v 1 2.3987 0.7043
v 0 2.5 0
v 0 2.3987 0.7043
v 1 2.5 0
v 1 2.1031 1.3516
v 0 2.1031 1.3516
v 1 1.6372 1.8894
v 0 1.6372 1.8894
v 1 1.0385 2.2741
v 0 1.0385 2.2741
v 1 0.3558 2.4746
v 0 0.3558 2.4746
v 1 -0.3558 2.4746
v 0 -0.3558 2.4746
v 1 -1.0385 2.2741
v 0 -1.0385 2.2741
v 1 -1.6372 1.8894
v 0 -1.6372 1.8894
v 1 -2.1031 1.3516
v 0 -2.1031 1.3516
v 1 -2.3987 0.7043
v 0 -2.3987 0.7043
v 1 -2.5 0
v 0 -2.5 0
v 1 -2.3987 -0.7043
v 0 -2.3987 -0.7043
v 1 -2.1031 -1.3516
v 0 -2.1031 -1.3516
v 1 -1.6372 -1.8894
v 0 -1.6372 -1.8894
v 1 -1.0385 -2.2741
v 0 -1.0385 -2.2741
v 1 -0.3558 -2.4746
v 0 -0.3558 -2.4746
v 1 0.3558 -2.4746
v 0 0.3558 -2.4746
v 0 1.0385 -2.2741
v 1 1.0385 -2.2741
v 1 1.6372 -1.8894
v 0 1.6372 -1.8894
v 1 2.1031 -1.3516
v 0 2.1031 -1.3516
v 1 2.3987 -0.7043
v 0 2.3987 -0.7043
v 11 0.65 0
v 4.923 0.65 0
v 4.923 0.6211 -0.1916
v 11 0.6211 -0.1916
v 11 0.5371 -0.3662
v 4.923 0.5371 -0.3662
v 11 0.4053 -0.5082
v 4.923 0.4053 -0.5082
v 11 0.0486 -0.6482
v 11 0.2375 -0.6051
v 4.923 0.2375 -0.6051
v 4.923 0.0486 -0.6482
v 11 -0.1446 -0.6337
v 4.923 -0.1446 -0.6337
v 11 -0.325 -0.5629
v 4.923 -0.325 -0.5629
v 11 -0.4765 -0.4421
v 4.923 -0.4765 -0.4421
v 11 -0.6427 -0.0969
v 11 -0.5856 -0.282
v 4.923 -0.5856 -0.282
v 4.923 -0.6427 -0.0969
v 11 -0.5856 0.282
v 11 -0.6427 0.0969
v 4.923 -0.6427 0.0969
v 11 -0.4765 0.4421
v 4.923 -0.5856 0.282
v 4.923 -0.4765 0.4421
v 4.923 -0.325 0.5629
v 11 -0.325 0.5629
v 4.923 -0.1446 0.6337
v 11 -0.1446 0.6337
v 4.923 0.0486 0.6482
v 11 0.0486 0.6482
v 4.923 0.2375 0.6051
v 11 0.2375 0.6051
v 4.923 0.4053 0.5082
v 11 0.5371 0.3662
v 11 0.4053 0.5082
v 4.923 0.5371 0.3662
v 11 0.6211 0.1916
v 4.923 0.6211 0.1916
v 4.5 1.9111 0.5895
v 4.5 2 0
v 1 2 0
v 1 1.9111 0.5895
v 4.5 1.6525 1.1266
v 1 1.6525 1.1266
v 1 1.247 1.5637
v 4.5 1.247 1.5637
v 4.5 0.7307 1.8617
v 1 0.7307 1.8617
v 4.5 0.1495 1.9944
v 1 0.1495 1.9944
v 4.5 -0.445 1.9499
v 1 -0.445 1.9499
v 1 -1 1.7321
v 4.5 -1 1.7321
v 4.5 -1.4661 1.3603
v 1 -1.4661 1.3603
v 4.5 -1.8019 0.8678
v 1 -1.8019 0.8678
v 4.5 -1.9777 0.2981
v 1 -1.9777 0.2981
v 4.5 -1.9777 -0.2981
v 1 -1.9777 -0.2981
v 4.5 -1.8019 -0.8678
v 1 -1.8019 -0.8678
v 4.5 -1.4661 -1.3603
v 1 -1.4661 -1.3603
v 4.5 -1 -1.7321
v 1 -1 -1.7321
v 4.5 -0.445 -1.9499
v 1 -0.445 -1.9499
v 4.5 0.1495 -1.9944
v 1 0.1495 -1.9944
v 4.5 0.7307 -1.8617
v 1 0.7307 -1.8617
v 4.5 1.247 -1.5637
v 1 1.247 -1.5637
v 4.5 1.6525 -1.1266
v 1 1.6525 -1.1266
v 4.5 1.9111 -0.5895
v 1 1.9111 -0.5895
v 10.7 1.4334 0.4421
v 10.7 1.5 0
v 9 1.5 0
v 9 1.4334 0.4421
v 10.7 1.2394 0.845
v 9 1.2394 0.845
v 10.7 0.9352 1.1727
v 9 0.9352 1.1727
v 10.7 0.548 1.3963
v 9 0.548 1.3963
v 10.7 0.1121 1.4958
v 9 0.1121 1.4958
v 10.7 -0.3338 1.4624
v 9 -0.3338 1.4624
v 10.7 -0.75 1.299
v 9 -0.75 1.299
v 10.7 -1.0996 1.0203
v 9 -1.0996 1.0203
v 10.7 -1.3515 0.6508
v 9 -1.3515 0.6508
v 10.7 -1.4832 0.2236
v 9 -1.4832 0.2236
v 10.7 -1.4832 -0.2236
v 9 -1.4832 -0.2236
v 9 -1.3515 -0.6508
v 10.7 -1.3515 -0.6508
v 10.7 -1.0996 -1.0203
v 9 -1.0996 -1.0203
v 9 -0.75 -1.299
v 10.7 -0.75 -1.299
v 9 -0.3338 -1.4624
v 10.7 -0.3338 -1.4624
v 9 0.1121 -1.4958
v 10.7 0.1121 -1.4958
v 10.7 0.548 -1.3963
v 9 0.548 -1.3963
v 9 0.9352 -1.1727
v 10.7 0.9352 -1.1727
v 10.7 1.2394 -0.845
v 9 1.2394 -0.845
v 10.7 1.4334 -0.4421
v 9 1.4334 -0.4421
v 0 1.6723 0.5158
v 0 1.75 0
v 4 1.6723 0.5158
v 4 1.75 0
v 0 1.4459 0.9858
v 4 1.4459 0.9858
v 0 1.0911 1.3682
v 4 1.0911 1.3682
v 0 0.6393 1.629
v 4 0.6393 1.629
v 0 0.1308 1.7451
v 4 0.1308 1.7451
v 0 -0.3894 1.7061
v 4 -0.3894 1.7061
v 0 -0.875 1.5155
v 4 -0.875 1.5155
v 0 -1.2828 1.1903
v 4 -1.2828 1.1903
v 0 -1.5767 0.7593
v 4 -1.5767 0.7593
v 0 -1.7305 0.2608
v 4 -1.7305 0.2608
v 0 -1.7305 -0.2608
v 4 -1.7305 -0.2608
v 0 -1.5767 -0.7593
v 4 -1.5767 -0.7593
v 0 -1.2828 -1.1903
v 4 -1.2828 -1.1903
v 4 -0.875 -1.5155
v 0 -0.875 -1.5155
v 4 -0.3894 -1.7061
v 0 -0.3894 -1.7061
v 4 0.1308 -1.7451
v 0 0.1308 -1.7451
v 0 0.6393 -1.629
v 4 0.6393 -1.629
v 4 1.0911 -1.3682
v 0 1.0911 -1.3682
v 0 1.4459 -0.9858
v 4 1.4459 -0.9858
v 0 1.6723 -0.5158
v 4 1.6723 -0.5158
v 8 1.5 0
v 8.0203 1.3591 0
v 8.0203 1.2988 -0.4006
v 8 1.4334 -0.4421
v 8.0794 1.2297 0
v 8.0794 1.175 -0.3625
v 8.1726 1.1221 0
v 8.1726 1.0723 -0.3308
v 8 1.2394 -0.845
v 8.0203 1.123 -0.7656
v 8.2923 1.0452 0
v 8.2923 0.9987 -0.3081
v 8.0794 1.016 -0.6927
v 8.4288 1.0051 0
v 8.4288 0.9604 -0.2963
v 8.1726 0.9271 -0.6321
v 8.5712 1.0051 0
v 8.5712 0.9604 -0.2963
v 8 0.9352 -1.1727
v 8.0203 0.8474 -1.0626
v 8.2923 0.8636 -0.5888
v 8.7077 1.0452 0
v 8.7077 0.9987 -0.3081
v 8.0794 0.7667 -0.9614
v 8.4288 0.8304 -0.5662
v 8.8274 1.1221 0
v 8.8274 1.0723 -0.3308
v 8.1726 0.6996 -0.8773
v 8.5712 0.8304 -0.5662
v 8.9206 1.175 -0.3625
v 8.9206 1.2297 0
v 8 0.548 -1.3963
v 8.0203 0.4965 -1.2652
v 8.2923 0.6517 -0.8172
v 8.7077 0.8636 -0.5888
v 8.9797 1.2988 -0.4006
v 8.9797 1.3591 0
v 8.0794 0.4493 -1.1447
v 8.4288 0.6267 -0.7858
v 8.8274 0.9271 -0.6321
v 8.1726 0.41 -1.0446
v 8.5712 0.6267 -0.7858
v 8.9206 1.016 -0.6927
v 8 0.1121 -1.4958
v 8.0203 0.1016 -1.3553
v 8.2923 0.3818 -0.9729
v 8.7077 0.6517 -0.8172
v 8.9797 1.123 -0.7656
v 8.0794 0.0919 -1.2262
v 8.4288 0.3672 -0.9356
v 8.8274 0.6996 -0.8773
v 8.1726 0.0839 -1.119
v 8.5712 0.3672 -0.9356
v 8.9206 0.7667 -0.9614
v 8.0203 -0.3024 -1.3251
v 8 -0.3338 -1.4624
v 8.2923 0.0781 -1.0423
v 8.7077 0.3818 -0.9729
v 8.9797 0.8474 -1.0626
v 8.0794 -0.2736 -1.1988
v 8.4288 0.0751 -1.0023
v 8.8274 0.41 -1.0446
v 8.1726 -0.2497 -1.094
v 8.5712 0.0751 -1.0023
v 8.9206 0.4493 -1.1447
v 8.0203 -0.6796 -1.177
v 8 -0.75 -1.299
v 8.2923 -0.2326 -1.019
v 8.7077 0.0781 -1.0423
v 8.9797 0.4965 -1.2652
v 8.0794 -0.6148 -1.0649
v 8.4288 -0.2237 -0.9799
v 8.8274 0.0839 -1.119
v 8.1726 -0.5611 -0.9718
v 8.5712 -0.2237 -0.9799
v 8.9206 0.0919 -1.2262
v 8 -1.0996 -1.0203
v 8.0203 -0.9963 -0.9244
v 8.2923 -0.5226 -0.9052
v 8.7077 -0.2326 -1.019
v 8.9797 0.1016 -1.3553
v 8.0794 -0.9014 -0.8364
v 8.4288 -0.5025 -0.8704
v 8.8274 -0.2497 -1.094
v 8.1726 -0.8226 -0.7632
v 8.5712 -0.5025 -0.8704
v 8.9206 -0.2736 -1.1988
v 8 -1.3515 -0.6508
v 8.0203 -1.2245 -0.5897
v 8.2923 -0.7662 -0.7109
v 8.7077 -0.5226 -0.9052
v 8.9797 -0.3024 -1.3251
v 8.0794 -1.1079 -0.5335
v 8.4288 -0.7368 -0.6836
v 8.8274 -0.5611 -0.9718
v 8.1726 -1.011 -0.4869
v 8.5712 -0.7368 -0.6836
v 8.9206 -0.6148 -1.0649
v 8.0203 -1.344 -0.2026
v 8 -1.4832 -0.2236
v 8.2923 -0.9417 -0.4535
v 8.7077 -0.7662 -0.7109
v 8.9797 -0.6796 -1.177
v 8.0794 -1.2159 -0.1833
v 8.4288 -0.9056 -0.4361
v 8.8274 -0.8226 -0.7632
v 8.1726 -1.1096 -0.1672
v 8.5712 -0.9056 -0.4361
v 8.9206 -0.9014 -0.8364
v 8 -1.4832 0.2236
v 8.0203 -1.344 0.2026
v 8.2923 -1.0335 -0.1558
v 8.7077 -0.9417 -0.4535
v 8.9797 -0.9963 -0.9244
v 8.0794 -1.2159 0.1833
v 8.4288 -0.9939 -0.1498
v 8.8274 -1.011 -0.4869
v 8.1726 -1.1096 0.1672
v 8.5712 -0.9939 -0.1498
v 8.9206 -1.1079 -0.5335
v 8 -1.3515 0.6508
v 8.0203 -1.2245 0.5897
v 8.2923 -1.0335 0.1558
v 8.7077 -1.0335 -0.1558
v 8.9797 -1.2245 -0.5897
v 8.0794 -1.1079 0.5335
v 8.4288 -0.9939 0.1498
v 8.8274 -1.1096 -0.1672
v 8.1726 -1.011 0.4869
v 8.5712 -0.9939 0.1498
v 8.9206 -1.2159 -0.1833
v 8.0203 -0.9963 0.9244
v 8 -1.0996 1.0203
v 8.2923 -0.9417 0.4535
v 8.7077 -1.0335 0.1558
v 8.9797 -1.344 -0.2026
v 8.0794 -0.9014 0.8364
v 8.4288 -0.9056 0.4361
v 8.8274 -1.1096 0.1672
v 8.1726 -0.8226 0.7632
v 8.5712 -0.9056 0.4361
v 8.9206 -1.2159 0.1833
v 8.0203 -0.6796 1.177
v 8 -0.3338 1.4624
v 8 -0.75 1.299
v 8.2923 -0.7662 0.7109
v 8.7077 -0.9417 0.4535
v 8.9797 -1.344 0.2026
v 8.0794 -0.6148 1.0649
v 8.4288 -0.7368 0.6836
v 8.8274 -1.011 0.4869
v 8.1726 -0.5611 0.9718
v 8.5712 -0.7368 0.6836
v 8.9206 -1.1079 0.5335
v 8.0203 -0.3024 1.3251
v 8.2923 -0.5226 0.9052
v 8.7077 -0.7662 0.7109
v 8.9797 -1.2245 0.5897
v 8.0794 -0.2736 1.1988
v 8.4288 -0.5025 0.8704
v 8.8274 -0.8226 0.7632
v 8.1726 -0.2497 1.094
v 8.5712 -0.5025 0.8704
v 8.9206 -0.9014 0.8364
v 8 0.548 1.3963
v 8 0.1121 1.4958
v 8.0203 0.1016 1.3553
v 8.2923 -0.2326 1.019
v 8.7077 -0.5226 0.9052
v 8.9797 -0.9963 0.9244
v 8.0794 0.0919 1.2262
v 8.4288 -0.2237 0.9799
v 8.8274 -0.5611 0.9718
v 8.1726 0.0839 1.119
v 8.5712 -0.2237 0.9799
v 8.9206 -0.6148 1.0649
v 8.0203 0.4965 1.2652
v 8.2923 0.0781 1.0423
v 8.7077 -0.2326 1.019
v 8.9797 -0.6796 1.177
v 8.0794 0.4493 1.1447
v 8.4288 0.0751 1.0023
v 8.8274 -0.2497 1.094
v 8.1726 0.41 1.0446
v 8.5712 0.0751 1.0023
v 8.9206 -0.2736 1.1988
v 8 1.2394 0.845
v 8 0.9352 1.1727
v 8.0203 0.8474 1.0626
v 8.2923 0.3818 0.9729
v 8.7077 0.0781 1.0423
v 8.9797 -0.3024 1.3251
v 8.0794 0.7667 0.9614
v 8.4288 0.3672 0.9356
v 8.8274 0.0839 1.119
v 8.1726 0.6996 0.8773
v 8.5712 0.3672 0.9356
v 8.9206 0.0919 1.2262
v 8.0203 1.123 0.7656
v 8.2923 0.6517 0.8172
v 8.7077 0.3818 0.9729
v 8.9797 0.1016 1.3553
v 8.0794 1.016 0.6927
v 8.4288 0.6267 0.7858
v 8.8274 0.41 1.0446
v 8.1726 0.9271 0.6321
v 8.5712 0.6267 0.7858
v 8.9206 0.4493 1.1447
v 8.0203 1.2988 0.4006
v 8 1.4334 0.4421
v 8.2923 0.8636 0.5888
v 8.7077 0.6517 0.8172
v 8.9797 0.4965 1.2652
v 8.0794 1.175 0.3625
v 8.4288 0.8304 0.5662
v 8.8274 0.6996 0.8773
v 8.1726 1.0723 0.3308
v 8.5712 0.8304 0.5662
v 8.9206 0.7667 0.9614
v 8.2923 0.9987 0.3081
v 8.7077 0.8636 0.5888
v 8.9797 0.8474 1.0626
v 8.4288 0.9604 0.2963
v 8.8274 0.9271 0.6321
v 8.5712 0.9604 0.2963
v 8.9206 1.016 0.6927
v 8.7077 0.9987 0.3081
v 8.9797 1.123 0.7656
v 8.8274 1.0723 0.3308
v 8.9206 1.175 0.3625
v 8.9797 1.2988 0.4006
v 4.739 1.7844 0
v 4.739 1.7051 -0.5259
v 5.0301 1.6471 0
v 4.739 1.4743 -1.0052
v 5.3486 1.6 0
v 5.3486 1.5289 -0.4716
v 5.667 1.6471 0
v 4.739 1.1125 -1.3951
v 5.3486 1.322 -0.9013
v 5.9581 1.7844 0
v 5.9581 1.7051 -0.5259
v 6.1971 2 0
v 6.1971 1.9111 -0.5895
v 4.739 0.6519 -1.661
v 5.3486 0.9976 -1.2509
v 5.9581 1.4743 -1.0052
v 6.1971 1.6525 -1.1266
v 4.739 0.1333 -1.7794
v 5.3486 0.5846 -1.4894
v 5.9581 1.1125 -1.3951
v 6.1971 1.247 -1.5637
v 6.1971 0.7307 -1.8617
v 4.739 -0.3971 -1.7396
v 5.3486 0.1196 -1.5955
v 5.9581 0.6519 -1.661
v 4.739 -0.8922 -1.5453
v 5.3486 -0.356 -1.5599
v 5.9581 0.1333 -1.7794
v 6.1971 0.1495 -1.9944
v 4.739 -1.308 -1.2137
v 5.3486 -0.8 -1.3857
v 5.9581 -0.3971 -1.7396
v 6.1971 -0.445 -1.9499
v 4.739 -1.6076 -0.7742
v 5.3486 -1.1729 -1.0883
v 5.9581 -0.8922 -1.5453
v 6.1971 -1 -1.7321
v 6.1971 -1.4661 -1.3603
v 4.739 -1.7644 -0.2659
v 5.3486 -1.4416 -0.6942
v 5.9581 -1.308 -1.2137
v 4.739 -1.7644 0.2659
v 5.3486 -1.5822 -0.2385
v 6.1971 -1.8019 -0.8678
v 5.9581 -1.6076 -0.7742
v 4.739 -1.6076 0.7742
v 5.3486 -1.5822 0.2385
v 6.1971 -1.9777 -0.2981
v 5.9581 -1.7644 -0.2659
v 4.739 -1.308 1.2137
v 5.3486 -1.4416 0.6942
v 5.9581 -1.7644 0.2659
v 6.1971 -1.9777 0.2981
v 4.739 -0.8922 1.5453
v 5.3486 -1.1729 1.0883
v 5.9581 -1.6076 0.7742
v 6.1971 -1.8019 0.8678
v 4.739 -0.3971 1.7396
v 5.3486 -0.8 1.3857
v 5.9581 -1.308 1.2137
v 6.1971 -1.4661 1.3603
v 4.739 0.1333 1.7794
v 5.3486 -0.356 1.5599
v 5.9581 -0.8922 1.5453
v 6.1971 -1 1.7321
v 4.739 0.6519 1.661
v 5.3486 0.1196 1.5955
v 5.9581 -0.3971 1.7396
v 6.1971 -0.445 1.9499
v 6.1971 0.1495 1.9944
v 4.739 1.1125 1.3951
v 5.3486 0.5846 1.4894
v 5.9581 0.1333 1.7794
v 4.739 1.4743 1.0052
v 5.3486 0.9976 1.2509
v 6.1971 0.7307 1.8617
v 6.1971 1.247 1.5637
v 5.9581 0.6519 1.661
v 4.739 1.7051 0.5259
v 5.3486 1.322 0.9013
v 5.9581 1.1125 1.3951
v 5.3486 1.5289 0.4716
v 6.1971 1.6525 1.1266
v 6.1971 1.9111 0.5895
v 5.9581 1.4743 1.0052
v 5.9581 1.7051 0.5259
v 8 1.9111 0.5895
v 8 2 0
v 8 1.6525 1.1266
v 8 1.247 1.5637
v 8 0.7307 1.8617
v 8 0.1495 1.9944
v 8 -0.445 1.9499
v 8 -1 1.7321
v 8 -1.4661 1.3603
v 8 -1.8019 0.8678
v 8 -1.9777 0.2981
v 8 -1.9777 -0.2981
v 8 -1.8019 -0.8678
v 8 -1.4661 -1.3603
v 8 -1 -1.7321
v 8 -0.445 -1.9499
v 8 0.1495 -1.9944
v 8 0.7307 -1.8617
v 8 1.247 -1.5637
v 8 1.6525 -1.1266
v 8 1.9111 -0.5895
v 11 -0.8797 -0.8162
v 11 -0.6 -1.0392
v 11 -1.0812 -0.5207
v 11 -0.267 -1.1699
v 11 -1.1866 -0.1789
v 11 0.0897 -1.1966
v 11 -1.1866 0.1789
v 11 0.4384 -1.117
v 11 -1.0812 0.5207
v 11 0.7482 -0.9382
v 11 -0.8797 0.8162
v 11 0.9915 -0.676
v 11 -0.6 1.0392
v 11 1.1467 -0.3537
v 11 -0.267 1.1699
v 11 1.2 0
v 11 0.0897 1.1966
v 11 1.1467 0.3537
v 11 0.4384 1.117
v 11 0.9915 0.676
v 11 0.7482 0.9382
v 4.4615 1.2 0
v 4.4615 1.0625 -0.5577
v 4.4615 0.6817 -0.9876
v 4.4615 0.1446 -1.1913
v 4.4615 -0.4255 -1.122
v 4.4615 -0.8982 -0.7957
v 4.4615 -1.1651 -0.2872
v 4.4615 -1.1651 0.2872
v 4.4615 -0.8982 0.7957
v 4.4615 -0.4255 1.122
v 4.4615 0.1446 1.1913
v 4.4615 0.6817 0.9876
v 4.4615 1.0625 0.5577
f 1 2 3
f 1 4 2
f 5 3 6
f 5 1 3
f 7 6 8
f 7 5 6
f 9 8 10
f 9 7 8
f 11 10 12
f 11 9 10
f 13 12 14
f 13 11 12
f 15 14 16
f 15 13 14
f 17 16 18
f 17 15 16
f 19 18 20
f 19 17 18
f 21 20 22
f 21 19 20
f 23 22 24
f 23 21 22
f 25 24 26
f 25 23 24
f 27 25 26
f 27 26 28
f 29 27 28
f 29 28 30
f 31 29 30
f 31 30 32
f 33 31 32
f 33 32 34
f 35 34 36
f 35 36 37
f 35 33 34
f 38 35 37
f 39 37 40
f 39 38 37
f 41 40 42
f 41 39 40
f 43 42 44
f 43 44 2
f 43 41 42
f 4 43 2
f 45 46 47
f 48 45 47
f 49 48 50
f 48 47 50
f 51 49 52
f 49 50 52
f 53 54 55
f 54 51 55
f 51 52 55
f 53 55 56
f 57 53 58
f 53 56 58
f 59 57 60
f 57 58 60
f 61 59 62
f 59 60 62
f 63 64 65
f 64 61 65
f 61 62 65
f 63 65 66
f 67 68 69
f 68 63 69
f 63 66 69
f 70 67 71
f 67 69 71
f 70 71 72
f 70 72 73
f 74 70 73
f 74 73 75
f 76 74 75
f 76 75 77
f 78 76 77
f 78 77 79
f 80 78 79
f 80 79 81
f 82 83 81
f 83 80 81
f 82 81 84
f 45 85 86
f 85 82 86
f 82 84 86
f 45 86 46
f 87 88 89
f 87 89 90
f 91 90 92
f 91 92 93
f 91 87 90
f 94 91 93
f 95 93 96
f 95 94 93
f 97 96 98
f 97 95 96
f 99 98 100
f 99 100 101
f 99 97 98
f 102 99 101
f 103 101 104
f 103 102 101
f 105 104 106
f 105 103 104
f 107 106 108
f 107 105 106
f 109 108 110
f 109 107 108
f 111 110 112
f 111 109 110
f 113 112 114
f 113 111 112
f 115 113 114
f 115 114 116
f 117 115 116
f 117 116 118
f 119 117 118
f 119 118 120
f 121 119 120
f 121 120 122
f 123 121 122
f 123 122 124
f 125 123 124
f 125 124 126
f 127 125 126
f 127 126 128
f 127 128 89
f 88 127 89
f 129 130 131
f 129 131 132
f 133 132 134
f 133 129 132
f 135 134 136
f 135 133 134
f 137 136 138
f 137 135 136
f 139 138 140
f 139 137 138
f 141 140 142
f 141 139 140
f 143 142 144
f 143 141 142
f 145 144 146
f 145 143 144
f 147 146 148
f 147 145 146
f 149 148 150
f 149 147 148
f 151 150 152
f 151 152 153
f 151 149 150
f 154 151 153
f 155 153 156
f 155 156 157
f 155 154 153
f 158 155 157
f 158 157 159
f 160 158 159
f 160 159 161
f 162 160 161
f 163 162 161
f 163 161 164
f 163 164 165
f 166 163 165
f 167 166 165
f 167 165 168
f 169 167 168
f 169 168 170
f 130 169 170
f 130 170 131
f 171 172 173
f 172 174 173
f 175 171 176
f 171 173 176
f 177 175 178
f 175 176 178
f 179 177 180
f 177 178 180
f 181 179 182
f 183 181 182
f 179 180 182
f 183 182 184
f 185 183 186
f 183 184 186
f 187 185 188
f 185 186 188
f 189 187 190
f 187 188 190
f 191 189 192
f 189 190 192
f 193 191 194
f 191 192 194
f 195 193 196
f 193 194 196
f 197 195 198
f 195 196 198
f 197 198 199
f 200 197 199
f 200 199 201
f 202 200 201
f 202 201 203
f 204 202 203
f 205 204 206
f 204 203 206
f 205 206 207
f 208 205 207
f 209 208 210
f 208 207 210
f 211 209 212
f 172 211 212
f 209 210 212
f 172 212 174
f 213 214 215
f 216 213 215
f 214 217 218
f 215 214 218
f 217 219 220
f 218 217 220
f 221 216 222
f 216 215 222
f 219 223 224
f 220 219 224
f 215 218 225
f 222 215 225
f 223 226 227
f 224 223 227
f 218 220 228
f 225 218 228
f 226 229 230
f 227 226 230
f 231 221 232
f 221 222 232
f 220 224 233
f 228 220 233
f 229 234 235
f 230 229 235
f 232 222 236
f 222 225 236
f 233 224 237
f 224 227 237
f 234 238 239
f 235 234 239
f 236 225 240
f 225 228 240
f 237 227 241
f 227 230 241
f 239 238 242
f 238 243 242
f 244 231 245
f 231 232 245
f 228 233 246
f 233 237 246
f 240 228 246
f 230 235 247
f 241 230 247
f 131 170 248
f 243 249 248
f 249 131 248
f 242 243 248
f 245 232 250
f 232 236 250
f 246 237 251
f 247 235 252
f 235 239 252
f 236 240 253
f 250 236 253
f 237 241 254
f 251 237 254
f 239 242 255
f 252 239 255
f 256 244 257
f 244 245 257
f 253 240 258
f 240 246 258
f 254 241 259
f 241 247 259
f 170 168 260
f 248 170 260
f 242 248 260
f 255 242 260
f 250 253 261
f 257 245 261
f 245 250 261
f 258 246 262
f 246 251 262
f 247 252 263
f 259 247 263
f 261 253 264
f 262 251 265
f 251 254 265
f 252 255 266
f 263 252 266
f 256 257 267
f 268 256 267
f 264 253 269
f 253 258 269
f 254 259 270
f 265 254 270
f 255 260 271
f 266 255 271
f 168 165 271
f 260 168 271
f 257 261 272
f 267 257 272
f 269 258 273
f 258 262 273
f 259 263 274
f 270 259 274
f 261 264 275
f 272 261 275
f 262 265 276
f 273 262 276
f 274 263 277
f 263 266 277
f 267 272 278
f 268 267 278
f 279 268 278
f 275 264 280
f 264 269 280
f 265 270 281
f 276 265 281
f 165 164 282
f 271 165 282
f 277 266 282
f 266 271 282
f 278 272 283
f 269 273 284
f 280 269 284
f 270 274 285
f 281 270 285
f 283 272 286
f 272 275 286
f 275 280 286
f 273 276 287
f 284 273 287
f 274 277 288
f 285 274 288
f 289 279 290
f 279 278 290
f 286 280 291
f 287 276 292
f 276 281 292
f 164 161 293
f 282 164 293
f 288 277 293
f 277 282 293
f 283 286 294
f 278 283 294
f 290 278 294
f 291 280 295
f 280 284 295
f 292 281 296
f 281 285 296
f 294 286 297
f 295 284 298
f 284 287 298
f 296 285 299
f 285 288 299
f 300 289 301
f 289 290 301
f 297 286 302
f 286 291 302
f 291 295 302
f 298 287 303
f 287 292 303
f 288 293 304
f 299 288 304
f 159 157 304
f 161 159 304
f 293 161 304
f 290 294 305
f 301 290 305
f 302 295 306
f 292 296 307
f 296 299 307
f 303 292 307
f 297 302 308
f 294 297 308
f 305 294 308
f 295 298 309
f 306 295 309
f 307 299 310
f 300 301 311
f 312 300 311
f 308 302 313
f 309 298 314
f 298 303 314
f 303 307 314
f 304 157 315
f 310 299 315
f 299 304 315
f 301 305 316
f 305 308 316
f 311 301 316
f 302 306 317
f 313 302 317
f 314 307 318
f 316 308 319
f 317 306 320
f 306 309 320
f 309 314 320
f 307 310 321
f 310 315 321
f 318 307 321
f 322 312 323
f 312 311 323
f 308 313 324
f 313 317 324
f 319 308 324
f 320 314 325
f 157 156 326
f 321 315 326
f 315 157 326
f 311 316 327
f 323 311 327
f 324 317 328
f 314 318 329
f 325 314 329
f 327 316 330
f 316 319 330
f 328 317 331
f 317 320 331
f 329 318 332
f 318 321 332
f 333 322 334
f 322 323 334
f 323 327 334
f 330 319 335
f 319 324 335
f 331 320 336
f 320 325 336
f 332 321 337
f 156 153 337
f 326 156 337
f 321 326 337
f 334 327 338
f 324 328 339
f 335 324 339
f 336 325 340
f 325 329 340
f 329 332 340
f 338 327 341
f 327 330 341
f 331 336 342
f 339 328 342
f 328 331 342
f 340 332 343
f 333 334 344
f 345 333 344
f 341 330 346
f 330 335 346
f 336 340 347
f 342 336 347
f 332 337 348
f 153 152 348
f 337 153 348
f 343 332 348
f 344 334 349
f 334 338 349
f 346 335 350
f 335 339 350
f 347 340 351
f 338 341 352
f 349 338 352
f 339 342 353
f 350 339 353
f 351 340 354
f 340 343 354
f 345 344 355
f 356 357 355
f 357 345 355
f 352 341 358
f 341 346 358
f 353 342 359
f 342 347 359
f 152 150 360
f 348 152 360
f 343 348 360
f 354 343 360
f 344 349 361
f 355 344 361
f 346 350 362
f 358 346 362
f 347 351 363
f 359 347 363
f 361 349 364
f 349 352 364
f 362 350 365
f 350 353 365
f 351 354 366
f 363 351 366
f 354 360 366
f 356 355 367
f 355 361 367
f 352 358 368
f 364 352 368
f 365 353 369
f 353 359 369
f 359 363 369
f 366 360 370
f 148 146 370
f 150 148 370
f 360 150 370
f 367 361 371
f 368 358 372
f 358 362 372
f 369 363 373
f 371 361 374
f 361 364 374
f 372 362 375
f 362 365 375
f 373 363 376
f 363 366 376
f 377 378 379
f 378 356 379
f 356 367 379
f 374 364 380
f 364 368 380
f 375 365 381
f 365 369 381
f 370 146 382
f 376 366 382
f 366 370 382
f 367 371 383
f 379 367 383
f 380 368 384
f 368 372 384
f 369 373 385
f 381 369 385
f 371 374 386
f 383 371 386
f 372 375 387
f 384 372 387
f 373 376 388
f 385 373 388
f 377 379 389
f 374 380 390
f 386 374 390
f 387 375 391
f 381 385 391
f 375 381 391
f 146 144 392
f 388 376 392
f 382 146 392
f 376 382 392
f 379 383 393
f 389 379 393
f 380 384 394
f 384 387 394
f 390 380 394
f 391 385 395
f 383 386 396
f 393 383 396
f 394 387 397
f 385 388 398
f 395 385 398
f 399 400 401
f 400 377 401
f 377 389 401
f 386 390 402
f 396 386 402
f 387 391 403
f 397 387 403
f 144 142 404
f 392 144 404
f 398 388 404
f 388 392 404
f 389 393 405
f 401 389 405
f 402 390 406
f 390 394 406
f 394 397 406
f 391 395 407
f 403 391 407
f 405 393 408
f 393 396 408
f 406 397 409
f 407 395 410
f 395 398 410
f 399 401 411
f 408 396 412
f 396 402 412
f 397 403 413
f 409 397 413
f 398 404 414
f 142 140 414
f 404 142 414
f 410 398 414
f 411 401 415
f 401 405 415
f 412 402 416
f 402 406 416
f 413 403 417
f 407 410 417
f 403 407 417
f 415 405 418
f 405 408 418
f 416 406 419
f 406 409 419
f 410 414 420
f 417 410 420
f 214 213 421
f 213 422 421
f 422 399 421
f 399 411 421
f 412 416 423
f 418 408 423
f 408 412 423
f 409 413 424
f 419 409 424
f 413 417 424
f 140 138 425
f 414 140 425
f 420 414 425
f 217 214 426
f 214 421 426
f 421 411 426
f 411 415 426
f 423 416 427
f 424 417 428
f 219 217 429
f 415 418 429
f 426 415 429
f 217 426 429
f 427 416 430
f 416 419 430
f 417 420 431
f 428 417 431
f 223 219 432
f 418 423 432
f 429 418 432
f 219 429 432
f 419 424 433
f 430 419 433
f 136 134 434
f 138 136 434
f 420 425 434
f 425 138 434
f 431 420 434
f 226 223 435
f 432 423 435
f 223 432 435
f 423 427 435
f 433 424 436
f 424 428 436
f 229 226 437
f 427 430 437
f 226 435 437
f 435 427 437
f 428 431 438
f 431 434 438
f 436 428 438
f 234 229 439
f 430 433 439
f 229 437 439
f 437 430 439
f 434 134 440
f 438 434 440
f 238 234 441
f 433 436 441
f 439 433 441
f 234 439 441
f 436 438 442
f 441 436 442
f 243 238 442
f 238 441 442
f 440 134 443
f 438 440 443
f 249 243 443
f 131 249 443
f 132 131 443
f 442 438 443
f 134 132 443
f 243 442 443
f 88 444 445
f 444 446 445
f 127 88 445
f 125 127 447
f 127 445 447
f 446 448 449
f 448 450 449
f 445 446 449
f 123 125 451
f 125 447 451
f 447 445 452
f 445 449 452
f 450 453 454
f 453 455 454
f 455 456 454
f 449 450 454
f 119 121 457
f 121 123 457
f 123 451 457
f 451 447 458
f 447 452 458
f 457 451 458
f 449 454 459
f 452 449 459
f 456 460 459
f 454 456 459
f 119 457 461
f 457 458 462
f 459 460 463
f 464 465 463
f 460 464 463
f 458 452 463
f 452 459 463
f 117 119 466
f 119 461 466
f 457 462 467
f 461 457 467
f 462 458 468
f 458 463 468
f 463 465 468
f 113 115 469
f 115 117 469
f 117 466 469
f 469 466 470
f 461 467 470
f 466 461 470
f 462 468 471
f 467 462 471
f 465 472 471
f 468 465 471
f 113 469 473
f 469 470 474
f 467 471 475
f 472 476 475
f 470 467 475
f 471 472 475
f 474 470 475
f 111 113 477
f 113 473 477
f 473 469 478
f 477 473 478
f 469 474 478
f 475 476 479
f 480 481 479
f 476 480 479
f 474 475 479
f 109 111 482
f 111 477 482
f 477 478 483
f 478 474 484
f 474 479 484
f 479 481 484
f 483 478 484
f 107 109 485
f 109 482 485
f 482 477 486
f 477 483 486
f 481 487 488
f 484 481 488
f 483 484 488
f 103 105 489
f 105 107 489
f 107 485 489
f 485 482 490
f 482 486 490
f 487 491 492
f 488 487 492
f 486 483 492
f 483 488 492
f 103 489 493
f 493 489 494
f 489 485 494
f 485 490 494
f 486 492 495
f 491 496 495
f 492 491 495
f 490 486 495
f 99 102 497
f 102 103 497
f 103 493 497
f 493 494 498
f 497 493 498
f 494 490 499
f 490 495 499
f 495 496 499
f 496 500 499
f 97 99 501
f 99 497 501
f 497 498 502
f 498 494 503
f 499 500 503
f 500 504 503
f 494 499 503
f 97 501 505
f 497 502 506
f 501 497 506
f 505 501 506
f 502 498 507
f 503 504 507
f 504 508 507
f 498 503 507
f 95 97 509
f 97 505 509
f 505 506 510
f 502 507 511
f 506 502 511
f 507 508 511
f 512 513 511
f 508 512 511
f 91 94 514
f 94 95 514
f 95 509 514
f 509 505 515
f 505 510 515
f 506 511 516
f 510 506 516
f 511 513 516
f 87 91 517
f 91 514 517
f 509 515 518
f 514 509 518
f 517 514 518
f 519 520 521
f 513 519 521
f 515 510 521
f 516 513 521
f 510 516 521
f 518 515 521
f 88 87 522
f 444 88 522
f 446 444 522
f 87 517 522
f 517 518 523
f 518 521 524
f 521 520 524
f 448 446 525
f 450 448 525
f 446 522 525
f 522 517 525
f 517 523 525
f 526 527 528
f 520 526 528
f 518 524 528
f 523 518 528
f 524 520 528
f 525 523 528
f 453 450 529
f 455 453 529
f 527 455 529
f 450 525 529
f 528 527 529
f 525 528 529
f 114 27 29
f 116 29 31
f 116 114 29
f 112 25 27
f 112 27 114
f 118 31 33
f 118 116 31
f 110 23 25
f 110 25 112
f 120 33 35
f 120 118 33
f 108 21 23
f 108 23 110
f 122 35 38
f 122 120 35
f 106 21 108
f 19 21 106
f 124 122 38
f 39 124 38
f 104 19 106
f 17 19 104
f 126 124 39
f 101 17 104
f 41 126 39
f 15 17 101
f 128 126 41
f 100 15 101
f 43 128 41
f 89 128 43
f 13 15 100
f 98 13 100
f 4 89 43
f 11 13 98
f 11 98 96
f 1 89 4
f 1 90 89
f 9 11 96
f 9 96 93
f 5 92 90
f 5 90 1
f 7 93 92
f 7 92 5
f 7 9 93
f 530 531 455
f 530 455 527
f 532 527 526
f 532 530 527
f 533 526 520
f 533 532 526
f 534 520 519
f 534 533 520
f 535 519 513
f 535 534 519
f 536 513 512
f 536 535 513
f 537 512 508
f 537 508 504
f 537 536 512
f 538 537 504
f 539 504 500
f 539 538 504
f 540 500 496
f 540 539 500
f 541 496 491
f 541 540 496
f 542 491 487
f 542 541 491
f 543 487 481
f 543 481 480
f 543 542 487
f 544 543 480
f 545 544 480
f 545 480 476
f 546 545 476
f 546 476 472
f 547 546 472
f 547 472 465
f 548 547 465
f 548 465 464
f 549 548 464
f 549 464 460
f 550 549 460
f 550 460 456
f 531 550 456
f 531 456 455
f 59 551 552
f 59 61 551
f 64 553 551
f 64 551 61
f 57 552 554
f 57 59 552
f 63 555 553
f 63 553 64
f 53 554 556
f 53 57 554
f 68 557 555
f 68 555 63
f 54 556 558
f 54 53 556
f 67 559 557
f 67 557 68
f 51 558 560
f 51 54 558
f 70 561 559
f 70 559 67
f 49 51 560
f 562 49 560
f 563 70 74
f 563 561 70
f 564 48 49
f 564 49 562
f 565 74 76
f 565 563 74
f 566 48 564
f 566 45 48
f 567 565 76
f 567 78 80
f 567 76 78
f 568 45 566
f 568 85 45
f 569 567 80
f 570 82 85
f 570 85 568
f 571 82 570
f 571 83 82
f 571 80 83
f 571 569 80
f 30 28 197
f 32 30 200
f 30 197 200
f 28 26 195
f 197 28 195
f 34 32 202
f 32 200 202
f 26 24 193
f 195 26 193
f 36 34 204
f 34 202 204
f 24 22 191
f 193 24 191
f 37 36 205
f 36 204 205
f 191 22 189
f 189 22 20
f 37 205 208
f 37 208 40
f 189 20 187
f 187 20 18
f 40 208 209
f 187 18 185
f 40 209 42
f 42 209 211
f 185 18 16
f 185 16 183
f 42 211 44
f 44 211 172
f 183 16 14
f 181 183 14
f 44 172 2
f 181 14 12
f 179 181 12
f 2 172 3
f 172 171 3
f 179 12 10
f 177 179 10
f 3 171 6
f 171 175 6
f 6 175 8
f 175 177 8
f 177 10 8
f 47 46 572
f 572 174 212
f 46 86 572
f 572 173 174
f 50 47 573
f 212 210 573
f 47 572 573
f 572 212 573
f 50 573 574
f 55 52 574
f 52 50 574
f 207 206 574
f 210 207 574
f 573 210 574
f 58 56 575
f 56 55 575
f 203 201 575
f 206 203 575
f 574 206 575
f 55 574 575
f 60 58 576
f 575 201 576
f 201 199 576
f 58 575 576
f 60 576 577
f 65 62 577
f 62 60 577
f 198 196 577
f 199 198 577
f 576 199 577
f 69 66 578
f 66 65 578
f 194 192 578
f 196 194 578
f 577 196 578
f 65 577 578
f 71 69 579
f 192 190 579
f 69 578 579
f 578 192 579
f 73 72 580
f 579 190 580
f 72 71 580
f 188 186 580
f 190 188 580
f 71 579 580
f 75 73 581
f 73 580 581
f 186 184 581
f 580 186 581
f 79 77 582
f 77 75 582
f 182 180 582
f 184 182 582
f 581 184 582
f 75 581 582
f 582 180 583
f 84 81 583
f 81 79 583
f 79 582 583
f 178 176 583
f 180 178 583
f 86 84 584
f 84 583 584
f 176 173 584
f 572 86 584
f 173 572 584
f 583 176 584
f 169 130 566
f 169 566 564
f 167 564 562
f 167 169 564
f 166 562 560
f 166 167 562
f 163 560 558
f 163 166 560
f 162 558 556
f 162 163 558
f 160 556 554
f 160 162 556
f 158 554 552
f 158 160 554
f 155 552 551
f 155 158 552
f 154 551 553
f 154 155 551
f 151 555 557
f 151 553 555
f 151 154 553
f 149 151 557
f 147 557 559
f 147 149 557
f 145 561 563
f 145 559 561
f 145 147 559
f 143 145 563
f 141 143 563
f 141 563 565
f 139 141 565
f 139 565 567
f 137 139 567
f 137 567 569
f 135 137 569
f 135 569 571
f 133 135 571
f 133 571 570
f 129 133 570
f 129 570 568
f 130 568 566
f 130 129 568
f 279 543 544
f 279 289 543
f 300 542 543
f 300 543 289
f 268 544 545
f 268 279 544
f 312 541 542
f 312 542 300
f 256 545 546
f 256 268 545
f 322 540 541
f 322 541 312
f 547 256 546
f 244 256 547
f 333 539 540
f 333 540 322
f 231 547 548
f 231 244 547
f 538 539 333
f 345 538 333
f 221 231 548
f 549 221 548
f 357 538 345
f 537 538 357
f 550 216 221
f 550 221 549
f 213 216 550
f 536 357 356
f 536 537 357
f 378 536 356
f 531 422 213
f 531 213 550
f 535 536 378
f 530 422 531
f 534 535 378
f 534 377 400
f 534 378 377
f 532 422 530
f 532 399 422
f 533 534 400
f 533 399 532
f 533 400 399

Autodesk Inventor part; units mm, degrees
ref_plane "YZ Plane" through (0, 0, 0) normal (1, 0, 0) x (0, 1, 0)
ref_plane "XZ Plane" through (0, 0, 0) normal (0, 1, 0) x (-1, 0, 0)
ref_plane "XY Plane" through (0, 0, 0) normal (0, 0, 1) x (1, 0, 0)
sketch "Skizze1" plane through (0, 0, 0) normal (0, 0, 1) x (1, 0, 0)
  line L0 (0, -1.0072) -> (0, 6.0435) projected
  line L1 (-2.2, 0) -> (13.2, 0) projected
  line L2 (0, 2.5) -> (0, 1.75)
  line L3 (0, 2.5) -> (1, 2.5)
  line L4 (1, 2.5) -> (1, 2)
  line L5 (1, 2) -> (4.5, 2)
  line L6 (0, 1.75) -> (4, 1.75)
  arc A0 (4.5, 2) -> (6.1971, 2) centre (5.3485, 2.7) ccw
  line L7 (6.1971, 2) -> (8, 2)
  line L8 (8, 2) -> (8, 1.5)
  arc A1 (8, 1.5) -> (9, 1.5) centre (8.5, 1.5) ccw
  line L9 (9, 1.5) -> (11, 1.5)
  line L10 (11, 1.5) -> (11, 0.65)
  line L11 (11, 0.65) -> (4.923, 0.65)
  line L12 (4.923, 0.65) -> (4, 1.75)
  line L13 (5.3485, 5.0362) -> (5.3485, 0.3638) construction
  point P0 (0, 0)
  dimension "d0" = 4
  dimension "d1" = 5
  dimension "d2" = 3.5
  dimension "d3" = 4
  dimension "d4" = 1.3
  dimension "d6" = 6.5
  dimension "d7" = 0.5
  dimension "d8" = 3
  dimension "d9" = 3
  dimension "d10" = 11
  dimension "d11" = 1
  dimension "d13" = 3.2
  dimension "d14" = 1.1
  dimension "d15" = 130
revolve "Umdrehung1" add sketch "Skizze1" angle 360 about axis through (-10, 0, 0) along (1, 0, 0)
thread "Gewinde1" size "M3x0.5" class "6g" standard "ANSI Metric M Profile" full length
chamfer "Fase1" distance 0.3 angle 45 1 edges at (11, -1.5, 0)
properties part number "Öler"
